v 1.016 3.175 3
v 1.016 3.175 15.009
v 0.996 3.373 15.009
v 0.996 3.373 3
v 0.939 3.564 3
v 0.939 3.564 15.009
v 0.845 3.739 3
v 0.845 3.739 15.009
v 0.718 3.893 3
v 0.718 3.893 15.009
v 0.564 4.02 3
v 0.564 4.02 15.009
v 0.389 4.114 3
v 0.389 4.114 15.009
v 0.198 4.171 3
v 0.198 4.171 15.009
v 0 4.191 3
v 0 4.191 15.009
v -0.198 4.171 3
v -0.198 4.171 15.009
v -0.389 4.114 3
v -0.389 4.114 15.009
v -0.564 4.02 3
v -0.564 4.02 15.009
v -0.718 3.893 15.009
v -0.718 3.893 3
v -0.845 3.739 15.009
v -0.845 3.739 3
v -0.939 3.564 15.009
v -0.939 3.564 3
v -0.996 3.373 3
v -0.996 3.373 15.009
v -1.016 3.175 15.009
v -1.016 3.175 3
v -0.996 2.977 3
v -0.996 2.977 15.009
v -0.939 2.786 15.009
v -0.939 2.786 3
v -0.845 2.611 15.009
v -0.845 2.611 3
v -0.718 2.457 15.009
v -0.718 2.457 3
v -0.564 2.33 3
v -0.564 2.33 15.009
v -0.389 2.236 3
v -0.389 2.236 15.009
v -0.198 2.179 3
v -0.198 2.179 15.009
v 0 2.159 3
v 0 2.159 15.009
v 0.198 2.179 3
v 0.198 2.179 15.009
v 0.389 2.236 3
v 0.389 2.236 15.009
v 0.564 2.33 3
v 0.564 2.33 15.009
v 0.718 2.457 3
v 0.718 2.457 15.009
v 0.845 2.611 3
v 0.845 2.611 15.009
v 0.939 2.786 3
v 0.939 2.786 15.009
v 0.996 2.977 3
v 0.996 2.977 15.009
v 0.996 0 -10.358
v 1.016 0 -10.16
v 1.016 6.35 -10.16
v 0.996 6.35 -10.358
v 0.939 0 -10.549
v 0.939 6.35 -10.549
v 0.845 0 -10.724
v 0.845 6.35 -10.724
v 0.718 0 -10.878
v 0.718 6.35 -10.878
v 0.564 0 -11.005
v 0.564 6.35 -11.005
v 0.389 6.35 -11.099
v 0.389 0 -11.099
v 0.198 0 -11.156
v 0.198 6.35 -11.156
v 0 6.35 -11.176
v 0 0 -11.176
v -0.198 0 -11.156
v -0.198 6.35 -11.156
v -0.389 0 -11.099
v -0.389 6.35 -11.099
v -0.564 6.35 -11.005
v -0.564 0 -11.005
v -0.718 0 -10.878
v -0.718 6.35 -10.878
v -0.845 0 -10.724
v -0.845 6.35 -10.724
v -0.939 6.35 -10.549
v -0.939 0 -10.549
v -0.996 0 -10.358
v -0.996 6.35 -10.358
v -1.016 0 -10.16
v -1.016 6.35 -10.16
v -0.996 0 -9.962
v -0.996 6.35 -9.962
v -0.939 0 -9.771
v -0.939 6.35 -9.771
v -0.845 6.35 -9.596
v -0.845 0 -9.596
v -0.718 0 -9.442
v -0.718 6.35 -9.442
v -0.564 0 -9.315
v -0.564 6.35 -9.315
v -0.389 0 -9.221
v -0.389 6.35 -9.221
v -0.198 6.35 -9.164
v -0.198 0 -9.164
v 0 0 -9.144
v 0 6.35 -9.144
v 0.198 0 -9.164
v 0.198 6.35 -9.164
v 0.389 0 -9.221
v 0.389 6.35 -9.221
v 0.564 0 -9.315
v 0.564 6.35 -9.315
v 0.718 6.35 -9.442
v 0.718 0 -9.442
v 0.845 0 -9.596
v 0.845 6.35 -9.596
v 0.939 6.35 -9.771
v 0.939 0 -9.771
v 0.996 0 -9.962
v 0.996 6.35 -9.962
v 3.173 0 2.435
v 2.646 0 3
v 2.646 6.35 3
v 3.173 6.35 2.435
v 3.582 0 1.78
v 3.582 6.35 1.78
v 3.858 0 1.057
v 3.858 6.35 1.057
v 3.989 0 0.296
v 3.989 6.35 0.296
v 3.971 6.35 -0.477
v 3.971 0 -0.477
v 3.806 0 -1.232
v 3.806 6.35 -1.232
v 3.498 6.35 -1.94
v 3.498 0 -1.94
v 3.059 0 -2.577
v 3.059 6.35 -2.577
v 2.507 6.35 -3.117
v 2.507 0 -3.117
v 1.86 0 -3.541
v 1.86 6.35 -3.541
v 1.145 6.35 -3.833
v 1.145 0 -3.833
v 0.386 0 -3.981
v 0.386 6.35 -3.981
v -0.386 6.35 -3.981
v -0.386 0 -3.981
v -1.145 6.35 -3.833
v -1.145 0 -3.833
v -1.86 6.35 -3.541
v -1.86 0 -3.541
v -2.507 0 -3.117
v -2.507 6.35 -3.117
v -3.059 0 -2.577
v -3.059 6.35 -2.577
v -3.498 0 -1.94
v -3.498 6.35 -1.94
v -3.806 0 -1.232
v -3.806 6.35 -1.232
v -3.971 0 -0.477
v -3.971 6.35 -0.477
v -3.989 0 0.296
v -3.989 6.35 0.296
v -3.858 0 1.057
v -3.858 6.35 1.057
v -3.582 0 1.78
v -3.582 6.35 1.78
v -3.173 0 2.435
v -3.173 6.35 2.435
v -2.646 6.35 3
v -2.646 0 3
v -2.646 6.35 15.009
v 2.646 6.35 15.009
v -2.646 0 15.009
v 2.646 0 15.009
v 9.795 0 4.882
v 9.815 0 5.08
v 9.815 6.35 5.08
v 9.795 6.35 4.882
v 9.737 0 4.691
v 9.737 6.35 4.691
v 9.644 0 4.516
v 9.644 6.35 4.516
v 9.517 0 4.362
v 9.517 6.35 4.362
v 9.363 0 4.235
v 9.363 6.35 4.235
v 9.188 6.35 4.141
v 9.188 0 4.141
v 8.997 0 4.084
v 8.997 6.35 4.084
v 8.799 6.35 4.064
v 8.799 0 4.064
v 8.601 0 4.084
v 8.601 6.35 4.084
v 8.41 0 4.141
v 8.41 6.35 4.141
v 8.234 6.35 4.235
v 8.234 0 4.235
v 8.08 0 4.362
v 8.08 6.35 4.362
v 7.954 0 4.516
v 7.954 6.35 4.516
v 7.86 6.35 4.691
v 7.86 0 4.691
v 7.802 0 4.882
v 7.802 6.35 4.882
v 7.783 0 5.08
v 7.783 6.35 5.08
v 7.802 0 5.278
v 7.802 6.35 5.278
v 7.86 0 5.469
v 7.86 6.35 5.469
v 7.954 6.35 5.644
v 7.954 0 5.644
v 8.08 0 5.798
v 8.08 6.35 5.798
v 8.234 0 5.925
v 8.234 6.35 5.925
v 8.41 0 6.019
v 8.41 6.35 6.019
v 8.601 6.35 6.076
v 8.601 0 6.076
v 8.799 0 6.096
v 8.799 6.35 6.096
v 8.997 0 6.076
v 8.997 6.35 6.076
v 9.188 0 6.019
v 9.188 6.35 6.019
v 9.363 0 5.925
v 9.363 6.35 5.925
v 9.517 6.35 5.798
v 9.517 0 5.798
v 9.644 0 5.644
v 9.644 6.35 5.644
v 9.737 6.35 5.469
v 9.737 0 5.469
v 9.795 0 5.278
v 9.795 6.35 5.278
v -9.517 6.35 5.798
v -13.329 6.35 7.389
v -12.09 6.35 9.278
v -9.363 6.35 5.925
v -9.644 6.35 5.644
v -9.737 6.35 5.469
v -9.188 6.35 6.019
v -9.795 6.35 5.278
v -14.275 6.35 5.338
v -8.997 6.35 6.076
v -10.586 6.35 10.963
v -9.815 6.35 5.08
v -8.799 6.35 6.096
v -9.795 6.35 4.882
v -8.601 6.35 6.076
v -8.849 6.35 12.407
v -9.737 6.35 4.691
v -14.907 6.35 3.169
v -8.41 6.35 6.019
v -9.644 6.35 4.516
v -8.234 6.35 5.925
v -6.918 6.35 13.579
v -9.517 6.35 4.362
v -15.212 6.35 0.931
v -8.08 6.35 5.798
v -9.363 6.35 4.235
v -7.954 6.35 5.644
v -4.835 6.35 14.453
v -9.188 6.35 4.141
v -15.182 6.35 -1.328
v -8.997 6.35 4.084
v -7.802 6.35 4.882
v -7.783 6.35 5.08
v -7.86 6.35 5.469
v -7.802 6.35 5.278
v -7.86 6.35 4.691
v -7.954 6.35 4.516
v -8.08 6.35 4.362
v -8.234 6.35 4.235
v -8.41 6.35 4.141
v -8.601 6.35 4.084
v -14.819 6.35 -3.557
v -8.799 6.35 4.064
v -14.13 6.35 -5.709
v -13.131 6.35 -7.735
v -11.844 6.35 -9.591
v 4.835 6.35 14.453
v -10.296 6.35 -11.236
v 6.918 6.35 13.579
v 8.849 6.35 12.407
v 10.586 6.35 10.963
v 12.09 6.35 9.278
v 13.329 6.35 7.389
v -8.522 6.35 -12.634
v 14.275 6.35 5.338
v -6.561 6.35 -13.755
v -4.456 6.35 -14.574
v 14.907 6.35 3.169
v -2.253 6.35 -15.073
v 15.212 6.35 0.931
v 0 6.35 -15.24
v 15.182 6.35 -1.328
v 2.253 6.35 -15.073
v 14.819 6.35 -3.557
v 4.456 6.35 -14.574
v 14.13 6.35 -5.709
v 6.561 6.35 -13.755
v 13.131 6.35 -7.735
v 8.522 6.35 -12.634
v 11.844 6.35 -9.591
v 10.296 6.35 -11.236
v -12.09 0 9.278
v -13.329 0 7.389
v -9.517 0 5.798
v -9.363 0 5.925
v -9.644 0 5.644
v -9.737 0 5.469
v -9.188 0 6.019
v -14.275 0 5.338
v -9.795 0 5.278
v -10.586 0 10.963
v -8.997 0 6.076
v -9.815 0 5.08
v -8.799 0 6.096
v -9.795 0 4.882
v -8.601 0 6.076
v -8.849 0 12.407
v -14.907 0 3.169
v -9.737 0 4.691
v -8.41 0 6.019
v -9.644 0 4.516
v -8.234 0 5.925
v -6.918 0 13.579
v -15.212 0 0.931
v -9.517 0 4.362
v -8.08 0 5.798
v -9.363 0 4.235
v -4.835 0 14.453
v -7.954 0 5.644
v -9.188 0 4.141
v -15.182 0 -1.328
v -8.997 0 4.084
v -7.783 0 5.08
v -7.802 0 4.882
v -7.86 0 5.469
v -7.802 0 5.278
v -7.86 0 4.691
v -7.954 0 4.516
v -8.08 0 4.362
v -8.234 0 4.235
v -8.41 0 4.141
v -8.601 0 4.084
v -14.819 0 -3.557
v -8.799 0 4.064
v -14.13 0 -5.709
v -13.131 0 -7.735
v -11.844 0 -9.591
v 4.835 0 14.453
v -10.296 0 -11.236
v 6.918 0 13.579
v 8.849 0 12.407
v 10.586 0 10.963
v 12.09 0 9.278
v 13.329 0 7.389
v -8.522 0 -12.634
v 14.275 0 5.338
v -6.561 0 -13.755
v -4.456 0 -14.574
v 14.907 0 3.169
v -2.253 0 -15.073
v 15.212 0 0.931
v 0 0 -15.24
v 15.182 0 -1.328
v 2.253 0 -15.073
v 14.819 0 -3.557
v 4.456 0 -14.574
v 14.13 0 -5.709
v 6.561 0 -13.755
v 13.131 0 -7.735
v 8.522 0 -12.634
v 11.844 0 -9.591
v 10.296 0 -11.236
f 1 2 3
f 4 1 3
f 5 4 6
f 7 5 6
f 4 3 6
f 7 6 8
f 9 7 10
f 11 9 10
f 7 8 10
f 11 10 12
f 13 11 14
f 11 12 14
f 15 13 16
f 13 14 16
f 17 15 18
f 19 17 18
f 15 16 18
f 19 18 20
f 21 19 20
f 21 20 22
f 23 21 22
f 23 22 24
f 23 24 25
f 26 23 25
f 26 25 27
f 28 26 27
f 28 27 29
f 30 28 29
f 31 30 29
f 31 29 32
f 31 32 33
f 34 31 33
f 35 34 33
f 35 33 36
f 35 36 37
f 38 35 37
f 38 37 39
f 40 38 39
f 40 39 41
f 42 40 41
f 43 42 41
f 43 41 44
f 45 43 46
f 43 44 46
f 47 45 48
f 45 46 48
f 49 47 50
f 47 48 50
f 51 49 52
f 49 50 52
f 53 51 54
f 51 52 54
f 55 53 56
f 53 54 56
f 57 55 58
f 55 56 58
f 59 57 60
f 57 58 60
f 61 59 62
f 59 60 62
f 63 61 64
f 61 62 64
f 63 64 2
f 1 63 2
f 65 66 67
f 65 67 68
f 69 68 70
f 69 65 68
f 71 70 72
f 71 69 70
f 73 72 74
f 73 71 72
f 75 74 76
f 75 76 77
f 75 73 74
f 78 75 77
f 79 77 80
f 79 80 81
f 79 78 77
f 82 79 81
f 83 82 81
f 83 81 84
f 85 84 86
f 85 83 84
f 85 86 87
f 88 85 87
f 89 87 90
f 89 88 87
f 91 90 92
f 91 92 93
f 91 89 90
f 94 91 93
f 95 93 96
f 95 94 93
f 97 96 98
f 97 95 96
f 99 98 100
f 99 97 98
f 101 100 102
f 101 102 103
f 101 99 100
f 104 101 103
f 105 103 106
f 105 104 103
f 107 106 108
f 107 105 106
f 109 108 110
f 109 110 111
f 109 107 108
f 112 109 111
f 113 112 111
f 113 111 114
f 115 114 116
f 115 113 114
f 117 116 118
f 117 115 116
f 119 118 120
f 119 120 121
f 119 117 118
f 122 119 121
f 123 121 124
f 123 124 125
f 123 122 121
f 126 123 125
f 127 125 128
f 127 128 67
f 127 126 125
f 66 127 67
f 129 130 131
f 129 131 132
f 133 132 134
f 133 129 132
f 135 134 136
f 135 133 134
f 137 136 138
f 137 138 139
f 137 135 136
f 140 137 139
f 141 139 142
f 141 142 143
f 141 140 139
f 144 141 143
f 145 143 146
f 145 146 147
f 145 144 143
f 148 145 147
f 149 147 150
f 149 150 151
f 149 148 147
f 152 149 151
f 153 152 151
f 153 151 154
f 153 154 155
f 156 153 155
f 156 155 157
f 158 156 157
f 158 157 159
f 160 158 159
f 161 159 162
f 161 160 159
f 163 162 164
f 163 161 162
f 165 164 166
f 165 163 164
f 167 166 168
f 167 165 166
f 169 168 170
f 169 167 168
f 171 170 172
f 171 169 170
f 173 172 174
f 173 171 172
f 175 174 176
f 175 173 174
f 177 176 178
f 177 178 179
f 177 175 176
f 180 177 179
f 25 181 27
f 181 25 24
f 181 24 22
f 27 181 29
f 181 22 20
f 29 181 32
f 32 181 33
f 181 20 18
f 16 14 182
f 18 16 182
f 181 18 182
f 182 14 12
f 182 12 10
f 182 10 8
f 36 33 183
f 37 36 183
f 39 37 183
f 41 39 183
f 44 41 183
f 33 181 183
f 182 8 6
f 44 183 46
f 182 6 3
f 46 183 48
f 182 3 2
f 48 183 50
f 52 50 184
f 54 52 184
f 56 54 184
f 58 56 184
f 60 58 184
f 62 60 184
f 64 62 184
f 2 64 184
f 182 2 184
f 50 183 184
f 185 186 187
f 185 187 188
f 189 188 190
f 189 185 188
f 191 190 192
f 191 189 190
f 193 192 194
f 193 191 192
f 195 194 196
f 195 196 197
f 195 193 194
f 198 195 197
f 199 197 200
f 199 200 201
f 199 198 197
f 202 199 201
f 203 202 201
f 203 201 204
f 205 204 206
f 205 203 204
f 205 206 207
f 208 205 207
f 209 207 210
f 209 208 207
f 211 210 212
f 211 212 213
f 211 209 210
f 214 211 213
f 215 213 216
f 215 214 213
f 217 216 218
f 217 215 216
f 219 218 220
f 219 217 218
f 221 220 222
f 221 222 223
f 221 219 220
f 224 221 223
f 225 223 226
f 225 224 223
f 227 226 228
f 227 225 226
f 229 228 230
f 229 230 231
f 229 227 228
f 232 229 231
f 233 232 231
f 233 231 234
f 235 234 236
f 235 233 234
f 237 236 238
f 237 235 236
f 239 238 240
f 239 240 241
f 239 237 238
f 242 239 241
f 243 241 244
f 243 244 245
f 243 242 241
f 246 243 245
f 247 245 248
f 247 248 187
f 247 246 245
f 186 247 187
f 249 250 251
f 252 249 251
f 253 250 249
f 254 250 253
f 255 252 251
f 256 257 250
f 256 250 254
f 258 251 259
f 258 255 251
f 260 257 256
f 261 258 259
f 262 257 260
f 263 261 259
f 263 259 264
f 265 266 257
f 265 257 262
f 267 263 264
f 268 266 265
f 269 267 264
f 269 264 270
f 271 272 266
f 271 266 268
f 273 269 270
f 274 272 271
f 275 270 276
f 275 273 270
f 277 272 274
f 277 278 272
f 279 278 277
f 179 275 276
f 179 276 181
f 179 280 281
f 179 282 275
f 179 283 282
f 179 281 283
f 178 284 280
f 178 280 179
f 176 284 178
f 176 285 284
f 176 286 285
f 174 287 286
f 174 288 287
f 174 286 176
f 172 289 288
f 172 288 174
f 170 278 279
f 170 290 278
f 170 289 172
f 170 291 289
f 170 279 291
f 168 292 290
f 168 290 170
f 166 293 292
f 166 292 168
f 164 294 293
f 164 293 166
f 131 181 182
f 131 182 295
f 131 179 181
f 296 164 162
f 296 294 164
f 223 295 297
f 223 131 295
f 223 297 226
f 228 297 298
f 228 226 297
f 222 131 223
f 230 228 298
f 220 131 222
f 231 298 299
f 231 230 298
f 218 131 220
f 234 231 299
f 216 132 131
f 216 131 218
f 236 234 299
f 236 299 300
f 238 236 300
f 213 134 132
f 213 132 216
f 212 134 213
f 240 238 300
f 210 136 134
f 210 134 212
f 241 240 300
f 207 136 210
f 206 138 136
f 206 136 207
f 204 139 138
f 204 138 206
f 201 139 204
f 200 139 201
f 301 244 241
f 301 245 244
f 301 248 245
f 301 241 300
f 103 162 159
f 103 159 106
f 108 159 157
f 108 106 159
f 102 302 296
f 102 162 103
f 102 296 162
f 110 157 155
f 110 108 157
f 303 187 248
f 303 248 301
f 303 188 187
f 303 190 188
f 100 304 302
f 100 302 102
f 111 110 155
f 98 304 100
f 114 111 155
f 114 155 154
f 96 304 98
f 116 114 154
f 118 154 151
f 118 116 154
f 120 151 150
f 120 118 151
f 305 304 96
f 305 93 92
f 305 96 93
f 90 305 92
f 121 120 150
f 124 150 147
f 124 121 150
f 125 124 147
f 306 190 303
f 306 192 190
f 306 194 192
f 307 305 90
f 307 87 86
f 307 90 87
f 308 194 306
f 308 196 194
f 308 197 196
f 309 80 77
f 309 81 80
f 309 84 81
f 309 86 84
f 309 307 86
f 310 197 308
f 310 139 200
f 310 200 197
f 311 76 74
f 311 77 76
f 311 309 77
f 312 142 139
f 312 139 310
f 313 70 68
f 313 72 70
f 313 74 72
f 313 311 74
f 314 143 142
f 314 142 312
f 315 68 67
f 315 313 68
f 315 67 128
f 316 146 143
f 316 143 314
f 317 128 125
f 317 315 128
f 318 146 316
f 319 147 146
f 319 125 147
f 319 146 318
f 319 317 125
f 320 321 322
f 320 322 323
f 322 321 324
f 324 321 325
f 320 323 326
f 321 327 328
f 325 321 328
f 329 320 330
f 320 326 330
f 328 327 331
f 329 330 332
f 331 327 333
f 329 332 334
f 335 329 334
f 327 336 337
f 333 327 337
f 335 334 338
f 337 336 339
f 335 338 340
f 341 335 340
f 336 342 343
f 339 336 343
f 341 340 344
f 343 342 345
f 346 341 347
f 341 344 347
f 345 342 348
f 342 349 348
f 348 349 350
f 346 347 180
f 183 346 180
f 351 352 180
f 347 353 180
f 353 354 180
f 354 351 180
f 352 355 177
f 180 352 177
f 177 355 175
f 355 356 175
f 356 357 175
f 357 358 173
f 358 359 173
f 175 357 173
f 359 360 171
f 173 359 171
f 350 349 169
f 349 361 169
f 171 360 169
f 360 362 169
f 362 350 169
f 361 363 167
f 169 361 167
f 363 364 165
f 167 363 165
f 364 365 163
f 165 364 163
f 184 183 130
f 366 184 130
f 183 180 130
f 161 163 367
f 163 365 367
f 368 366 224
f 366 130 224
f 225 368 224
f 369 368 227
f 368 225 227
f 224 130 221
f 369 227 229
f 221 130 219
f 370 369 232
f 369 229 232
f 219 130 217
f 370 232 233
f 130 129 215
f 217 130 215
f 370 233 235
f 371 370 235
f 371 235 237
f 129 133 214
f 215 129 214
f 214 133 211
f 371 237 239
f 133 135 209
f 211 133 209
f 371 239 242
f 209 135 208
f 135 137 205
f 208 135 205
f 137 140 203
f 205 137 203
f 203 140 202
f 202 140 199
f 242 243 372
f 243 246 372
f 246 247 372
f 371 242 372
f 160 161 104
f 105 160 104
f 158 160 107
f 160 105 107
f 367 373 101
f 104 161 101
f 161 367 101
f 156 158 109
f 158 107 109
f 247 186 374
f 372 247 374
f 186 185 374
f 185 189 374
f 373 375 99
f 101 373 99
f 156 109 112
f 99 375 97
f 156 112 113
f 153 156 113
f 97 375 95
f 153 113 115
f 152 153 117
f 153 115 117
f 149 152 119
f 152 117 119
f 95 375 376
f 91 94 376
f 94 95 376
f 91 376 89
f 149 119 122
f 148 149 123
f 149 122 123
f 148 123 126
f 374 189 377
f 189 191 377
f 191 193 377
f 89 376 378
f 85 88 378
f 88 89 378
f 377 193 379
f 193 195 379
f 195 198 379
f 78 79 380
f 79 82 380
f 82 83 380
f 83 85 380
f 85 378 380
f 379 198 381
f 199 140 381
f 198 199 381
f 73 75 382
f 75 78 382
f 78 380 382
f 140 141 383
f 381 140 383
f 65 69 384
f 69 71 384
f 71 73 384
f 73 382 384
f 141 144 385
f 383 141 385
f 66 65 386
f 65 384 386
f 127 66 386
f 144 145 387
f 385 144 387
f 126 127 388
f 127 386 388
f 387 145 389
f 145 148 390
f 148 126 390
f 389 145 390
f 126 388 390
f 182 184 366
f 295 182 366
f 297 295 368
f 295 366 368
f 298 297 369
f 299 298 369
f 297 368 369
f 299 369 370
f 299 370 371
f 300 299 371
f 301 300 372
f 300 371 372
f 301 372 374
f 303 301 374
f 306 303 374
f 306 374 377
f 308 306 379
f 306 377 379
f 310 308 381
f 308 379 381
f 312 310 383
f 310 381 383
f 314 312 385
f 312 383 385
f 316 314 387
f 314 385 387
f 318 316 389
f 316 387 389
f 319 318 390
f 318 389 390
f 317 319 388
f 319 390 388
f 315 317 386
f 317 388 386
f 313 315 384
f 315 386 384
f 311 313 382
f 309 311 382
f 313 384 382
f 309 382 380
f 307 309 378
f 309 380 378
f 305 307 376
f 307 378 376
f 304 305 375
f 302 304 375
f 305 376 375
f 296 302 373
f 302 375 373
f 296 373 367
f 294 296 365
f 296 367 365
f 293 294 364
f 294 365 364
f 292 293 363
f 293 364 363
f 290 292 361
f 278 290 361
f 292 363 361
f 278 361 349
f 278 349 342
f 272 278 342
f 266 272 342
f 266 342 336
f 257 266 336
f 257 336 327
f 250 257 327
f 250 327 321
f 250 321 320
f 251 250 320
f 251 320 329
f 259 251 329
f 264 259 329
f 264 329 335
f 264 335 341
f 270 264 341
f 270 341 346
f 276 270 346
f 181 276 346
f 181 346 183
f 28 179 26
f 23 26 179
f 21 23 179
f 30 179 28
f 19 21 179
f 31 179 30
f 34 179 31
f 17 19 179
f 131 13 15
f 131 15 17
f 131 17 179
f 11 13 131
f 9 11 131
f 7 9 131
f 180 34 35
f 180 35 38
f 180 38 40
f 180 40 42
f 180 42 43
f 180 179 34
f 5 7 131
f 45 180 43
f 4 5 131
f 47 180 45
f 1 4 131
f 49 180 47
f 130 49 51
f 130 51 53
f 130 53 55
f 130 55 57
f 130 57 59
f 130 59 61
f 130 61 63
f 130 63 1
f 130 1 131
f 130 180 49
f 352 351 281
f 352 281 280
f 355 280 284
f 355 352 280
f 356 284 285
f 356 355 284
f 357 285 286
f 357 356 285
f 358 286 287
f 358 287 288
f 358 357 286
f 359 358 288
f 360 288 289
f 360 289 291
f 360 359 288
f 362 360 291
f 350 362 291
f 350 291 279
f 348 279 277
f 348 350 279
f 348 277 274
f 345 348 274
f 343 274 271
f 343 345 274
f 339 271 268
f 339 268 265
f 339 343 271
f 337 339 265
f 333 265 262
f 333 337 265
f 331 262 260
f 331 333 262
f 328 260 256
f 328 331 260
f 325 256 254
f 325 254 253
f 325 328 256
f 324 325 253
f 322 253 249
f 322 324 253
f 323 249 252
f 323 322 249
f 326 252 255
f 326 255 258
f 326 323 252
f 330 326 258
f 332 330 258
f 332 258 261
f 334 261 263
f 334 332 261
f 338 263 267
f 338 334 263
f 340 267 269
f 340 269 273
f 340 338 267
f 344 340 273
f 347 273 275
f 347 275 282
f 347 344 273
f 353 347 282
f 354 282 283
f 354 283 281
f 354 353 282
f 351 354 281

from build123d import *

# Parameters (mm, degrees)
SKETCH1_R           = 1.016
BOSS_EXTRUDE1_DEPTH = 6.35
CUT_EXTRUDE1_REACH  = 32.249
SKETCH2_R           = 1.016


with BuildPart() as part:
    # Sketch1 → Boss-Extrude1 (new body)
    with BuildSketch(Plane(origin=(0, 0, 0), x_dir=(1, 0, 0), z_dir=(0, 1, 0))):
        with BuildLine():
            Line((-2.645751311, -15.00858421), (2.645751311, -15.00858421))
            ThreePointArc((2.645751311, -15.00858421), (0, 15.24), (-2.645751311, -15.00858421))
        make_face()
        with Locations((0, 10.16)):
            Circle(SKETCH1_R, mode=Mode.SUBTRACT)
        with Locations((8.798818102, -5.08)):
            Circle(SKETCH1_R, mode=Mode.SUBTRACT)
        with Locations((-8.798818102, -5.08)):
            Circle(SKETCH1_R, mode=Mode.SUBTRACT)
        with BuildLine():
            Line((-2.645751311, -3), (2.645751311, -3))
            ThreePointArc((2.645751311, -3), (0, 4), (-2.645751311, -3))
        make_face(mode=Mode.SUBTRACT)
    extrude(amount=BOSS_EXTRUDE1_DEPTH)

    # Sketch2 → Cut-Extrude1 (cut, up to next)
    with BuildSketch(Plane.XY.offset(15.00858421), mode=Mode.PRIVATE) as cut_extrude1_sk1:
        with Locations((0, 3.175)):
            Circle(SKETCH2_R)
    cut_extrude1_tool1 = extrude(cut_extrude1_sk1.sketch, amount=-CUT_EXTRUDE1_REACH, mode=Mode.PRIVATE) & part.part
    add(cut_extrude1_tool1.solids().sort_by_distance((0, 3.175, 15.008584))[0], mode=Mode.SUBTRACT)


solid = part.part
